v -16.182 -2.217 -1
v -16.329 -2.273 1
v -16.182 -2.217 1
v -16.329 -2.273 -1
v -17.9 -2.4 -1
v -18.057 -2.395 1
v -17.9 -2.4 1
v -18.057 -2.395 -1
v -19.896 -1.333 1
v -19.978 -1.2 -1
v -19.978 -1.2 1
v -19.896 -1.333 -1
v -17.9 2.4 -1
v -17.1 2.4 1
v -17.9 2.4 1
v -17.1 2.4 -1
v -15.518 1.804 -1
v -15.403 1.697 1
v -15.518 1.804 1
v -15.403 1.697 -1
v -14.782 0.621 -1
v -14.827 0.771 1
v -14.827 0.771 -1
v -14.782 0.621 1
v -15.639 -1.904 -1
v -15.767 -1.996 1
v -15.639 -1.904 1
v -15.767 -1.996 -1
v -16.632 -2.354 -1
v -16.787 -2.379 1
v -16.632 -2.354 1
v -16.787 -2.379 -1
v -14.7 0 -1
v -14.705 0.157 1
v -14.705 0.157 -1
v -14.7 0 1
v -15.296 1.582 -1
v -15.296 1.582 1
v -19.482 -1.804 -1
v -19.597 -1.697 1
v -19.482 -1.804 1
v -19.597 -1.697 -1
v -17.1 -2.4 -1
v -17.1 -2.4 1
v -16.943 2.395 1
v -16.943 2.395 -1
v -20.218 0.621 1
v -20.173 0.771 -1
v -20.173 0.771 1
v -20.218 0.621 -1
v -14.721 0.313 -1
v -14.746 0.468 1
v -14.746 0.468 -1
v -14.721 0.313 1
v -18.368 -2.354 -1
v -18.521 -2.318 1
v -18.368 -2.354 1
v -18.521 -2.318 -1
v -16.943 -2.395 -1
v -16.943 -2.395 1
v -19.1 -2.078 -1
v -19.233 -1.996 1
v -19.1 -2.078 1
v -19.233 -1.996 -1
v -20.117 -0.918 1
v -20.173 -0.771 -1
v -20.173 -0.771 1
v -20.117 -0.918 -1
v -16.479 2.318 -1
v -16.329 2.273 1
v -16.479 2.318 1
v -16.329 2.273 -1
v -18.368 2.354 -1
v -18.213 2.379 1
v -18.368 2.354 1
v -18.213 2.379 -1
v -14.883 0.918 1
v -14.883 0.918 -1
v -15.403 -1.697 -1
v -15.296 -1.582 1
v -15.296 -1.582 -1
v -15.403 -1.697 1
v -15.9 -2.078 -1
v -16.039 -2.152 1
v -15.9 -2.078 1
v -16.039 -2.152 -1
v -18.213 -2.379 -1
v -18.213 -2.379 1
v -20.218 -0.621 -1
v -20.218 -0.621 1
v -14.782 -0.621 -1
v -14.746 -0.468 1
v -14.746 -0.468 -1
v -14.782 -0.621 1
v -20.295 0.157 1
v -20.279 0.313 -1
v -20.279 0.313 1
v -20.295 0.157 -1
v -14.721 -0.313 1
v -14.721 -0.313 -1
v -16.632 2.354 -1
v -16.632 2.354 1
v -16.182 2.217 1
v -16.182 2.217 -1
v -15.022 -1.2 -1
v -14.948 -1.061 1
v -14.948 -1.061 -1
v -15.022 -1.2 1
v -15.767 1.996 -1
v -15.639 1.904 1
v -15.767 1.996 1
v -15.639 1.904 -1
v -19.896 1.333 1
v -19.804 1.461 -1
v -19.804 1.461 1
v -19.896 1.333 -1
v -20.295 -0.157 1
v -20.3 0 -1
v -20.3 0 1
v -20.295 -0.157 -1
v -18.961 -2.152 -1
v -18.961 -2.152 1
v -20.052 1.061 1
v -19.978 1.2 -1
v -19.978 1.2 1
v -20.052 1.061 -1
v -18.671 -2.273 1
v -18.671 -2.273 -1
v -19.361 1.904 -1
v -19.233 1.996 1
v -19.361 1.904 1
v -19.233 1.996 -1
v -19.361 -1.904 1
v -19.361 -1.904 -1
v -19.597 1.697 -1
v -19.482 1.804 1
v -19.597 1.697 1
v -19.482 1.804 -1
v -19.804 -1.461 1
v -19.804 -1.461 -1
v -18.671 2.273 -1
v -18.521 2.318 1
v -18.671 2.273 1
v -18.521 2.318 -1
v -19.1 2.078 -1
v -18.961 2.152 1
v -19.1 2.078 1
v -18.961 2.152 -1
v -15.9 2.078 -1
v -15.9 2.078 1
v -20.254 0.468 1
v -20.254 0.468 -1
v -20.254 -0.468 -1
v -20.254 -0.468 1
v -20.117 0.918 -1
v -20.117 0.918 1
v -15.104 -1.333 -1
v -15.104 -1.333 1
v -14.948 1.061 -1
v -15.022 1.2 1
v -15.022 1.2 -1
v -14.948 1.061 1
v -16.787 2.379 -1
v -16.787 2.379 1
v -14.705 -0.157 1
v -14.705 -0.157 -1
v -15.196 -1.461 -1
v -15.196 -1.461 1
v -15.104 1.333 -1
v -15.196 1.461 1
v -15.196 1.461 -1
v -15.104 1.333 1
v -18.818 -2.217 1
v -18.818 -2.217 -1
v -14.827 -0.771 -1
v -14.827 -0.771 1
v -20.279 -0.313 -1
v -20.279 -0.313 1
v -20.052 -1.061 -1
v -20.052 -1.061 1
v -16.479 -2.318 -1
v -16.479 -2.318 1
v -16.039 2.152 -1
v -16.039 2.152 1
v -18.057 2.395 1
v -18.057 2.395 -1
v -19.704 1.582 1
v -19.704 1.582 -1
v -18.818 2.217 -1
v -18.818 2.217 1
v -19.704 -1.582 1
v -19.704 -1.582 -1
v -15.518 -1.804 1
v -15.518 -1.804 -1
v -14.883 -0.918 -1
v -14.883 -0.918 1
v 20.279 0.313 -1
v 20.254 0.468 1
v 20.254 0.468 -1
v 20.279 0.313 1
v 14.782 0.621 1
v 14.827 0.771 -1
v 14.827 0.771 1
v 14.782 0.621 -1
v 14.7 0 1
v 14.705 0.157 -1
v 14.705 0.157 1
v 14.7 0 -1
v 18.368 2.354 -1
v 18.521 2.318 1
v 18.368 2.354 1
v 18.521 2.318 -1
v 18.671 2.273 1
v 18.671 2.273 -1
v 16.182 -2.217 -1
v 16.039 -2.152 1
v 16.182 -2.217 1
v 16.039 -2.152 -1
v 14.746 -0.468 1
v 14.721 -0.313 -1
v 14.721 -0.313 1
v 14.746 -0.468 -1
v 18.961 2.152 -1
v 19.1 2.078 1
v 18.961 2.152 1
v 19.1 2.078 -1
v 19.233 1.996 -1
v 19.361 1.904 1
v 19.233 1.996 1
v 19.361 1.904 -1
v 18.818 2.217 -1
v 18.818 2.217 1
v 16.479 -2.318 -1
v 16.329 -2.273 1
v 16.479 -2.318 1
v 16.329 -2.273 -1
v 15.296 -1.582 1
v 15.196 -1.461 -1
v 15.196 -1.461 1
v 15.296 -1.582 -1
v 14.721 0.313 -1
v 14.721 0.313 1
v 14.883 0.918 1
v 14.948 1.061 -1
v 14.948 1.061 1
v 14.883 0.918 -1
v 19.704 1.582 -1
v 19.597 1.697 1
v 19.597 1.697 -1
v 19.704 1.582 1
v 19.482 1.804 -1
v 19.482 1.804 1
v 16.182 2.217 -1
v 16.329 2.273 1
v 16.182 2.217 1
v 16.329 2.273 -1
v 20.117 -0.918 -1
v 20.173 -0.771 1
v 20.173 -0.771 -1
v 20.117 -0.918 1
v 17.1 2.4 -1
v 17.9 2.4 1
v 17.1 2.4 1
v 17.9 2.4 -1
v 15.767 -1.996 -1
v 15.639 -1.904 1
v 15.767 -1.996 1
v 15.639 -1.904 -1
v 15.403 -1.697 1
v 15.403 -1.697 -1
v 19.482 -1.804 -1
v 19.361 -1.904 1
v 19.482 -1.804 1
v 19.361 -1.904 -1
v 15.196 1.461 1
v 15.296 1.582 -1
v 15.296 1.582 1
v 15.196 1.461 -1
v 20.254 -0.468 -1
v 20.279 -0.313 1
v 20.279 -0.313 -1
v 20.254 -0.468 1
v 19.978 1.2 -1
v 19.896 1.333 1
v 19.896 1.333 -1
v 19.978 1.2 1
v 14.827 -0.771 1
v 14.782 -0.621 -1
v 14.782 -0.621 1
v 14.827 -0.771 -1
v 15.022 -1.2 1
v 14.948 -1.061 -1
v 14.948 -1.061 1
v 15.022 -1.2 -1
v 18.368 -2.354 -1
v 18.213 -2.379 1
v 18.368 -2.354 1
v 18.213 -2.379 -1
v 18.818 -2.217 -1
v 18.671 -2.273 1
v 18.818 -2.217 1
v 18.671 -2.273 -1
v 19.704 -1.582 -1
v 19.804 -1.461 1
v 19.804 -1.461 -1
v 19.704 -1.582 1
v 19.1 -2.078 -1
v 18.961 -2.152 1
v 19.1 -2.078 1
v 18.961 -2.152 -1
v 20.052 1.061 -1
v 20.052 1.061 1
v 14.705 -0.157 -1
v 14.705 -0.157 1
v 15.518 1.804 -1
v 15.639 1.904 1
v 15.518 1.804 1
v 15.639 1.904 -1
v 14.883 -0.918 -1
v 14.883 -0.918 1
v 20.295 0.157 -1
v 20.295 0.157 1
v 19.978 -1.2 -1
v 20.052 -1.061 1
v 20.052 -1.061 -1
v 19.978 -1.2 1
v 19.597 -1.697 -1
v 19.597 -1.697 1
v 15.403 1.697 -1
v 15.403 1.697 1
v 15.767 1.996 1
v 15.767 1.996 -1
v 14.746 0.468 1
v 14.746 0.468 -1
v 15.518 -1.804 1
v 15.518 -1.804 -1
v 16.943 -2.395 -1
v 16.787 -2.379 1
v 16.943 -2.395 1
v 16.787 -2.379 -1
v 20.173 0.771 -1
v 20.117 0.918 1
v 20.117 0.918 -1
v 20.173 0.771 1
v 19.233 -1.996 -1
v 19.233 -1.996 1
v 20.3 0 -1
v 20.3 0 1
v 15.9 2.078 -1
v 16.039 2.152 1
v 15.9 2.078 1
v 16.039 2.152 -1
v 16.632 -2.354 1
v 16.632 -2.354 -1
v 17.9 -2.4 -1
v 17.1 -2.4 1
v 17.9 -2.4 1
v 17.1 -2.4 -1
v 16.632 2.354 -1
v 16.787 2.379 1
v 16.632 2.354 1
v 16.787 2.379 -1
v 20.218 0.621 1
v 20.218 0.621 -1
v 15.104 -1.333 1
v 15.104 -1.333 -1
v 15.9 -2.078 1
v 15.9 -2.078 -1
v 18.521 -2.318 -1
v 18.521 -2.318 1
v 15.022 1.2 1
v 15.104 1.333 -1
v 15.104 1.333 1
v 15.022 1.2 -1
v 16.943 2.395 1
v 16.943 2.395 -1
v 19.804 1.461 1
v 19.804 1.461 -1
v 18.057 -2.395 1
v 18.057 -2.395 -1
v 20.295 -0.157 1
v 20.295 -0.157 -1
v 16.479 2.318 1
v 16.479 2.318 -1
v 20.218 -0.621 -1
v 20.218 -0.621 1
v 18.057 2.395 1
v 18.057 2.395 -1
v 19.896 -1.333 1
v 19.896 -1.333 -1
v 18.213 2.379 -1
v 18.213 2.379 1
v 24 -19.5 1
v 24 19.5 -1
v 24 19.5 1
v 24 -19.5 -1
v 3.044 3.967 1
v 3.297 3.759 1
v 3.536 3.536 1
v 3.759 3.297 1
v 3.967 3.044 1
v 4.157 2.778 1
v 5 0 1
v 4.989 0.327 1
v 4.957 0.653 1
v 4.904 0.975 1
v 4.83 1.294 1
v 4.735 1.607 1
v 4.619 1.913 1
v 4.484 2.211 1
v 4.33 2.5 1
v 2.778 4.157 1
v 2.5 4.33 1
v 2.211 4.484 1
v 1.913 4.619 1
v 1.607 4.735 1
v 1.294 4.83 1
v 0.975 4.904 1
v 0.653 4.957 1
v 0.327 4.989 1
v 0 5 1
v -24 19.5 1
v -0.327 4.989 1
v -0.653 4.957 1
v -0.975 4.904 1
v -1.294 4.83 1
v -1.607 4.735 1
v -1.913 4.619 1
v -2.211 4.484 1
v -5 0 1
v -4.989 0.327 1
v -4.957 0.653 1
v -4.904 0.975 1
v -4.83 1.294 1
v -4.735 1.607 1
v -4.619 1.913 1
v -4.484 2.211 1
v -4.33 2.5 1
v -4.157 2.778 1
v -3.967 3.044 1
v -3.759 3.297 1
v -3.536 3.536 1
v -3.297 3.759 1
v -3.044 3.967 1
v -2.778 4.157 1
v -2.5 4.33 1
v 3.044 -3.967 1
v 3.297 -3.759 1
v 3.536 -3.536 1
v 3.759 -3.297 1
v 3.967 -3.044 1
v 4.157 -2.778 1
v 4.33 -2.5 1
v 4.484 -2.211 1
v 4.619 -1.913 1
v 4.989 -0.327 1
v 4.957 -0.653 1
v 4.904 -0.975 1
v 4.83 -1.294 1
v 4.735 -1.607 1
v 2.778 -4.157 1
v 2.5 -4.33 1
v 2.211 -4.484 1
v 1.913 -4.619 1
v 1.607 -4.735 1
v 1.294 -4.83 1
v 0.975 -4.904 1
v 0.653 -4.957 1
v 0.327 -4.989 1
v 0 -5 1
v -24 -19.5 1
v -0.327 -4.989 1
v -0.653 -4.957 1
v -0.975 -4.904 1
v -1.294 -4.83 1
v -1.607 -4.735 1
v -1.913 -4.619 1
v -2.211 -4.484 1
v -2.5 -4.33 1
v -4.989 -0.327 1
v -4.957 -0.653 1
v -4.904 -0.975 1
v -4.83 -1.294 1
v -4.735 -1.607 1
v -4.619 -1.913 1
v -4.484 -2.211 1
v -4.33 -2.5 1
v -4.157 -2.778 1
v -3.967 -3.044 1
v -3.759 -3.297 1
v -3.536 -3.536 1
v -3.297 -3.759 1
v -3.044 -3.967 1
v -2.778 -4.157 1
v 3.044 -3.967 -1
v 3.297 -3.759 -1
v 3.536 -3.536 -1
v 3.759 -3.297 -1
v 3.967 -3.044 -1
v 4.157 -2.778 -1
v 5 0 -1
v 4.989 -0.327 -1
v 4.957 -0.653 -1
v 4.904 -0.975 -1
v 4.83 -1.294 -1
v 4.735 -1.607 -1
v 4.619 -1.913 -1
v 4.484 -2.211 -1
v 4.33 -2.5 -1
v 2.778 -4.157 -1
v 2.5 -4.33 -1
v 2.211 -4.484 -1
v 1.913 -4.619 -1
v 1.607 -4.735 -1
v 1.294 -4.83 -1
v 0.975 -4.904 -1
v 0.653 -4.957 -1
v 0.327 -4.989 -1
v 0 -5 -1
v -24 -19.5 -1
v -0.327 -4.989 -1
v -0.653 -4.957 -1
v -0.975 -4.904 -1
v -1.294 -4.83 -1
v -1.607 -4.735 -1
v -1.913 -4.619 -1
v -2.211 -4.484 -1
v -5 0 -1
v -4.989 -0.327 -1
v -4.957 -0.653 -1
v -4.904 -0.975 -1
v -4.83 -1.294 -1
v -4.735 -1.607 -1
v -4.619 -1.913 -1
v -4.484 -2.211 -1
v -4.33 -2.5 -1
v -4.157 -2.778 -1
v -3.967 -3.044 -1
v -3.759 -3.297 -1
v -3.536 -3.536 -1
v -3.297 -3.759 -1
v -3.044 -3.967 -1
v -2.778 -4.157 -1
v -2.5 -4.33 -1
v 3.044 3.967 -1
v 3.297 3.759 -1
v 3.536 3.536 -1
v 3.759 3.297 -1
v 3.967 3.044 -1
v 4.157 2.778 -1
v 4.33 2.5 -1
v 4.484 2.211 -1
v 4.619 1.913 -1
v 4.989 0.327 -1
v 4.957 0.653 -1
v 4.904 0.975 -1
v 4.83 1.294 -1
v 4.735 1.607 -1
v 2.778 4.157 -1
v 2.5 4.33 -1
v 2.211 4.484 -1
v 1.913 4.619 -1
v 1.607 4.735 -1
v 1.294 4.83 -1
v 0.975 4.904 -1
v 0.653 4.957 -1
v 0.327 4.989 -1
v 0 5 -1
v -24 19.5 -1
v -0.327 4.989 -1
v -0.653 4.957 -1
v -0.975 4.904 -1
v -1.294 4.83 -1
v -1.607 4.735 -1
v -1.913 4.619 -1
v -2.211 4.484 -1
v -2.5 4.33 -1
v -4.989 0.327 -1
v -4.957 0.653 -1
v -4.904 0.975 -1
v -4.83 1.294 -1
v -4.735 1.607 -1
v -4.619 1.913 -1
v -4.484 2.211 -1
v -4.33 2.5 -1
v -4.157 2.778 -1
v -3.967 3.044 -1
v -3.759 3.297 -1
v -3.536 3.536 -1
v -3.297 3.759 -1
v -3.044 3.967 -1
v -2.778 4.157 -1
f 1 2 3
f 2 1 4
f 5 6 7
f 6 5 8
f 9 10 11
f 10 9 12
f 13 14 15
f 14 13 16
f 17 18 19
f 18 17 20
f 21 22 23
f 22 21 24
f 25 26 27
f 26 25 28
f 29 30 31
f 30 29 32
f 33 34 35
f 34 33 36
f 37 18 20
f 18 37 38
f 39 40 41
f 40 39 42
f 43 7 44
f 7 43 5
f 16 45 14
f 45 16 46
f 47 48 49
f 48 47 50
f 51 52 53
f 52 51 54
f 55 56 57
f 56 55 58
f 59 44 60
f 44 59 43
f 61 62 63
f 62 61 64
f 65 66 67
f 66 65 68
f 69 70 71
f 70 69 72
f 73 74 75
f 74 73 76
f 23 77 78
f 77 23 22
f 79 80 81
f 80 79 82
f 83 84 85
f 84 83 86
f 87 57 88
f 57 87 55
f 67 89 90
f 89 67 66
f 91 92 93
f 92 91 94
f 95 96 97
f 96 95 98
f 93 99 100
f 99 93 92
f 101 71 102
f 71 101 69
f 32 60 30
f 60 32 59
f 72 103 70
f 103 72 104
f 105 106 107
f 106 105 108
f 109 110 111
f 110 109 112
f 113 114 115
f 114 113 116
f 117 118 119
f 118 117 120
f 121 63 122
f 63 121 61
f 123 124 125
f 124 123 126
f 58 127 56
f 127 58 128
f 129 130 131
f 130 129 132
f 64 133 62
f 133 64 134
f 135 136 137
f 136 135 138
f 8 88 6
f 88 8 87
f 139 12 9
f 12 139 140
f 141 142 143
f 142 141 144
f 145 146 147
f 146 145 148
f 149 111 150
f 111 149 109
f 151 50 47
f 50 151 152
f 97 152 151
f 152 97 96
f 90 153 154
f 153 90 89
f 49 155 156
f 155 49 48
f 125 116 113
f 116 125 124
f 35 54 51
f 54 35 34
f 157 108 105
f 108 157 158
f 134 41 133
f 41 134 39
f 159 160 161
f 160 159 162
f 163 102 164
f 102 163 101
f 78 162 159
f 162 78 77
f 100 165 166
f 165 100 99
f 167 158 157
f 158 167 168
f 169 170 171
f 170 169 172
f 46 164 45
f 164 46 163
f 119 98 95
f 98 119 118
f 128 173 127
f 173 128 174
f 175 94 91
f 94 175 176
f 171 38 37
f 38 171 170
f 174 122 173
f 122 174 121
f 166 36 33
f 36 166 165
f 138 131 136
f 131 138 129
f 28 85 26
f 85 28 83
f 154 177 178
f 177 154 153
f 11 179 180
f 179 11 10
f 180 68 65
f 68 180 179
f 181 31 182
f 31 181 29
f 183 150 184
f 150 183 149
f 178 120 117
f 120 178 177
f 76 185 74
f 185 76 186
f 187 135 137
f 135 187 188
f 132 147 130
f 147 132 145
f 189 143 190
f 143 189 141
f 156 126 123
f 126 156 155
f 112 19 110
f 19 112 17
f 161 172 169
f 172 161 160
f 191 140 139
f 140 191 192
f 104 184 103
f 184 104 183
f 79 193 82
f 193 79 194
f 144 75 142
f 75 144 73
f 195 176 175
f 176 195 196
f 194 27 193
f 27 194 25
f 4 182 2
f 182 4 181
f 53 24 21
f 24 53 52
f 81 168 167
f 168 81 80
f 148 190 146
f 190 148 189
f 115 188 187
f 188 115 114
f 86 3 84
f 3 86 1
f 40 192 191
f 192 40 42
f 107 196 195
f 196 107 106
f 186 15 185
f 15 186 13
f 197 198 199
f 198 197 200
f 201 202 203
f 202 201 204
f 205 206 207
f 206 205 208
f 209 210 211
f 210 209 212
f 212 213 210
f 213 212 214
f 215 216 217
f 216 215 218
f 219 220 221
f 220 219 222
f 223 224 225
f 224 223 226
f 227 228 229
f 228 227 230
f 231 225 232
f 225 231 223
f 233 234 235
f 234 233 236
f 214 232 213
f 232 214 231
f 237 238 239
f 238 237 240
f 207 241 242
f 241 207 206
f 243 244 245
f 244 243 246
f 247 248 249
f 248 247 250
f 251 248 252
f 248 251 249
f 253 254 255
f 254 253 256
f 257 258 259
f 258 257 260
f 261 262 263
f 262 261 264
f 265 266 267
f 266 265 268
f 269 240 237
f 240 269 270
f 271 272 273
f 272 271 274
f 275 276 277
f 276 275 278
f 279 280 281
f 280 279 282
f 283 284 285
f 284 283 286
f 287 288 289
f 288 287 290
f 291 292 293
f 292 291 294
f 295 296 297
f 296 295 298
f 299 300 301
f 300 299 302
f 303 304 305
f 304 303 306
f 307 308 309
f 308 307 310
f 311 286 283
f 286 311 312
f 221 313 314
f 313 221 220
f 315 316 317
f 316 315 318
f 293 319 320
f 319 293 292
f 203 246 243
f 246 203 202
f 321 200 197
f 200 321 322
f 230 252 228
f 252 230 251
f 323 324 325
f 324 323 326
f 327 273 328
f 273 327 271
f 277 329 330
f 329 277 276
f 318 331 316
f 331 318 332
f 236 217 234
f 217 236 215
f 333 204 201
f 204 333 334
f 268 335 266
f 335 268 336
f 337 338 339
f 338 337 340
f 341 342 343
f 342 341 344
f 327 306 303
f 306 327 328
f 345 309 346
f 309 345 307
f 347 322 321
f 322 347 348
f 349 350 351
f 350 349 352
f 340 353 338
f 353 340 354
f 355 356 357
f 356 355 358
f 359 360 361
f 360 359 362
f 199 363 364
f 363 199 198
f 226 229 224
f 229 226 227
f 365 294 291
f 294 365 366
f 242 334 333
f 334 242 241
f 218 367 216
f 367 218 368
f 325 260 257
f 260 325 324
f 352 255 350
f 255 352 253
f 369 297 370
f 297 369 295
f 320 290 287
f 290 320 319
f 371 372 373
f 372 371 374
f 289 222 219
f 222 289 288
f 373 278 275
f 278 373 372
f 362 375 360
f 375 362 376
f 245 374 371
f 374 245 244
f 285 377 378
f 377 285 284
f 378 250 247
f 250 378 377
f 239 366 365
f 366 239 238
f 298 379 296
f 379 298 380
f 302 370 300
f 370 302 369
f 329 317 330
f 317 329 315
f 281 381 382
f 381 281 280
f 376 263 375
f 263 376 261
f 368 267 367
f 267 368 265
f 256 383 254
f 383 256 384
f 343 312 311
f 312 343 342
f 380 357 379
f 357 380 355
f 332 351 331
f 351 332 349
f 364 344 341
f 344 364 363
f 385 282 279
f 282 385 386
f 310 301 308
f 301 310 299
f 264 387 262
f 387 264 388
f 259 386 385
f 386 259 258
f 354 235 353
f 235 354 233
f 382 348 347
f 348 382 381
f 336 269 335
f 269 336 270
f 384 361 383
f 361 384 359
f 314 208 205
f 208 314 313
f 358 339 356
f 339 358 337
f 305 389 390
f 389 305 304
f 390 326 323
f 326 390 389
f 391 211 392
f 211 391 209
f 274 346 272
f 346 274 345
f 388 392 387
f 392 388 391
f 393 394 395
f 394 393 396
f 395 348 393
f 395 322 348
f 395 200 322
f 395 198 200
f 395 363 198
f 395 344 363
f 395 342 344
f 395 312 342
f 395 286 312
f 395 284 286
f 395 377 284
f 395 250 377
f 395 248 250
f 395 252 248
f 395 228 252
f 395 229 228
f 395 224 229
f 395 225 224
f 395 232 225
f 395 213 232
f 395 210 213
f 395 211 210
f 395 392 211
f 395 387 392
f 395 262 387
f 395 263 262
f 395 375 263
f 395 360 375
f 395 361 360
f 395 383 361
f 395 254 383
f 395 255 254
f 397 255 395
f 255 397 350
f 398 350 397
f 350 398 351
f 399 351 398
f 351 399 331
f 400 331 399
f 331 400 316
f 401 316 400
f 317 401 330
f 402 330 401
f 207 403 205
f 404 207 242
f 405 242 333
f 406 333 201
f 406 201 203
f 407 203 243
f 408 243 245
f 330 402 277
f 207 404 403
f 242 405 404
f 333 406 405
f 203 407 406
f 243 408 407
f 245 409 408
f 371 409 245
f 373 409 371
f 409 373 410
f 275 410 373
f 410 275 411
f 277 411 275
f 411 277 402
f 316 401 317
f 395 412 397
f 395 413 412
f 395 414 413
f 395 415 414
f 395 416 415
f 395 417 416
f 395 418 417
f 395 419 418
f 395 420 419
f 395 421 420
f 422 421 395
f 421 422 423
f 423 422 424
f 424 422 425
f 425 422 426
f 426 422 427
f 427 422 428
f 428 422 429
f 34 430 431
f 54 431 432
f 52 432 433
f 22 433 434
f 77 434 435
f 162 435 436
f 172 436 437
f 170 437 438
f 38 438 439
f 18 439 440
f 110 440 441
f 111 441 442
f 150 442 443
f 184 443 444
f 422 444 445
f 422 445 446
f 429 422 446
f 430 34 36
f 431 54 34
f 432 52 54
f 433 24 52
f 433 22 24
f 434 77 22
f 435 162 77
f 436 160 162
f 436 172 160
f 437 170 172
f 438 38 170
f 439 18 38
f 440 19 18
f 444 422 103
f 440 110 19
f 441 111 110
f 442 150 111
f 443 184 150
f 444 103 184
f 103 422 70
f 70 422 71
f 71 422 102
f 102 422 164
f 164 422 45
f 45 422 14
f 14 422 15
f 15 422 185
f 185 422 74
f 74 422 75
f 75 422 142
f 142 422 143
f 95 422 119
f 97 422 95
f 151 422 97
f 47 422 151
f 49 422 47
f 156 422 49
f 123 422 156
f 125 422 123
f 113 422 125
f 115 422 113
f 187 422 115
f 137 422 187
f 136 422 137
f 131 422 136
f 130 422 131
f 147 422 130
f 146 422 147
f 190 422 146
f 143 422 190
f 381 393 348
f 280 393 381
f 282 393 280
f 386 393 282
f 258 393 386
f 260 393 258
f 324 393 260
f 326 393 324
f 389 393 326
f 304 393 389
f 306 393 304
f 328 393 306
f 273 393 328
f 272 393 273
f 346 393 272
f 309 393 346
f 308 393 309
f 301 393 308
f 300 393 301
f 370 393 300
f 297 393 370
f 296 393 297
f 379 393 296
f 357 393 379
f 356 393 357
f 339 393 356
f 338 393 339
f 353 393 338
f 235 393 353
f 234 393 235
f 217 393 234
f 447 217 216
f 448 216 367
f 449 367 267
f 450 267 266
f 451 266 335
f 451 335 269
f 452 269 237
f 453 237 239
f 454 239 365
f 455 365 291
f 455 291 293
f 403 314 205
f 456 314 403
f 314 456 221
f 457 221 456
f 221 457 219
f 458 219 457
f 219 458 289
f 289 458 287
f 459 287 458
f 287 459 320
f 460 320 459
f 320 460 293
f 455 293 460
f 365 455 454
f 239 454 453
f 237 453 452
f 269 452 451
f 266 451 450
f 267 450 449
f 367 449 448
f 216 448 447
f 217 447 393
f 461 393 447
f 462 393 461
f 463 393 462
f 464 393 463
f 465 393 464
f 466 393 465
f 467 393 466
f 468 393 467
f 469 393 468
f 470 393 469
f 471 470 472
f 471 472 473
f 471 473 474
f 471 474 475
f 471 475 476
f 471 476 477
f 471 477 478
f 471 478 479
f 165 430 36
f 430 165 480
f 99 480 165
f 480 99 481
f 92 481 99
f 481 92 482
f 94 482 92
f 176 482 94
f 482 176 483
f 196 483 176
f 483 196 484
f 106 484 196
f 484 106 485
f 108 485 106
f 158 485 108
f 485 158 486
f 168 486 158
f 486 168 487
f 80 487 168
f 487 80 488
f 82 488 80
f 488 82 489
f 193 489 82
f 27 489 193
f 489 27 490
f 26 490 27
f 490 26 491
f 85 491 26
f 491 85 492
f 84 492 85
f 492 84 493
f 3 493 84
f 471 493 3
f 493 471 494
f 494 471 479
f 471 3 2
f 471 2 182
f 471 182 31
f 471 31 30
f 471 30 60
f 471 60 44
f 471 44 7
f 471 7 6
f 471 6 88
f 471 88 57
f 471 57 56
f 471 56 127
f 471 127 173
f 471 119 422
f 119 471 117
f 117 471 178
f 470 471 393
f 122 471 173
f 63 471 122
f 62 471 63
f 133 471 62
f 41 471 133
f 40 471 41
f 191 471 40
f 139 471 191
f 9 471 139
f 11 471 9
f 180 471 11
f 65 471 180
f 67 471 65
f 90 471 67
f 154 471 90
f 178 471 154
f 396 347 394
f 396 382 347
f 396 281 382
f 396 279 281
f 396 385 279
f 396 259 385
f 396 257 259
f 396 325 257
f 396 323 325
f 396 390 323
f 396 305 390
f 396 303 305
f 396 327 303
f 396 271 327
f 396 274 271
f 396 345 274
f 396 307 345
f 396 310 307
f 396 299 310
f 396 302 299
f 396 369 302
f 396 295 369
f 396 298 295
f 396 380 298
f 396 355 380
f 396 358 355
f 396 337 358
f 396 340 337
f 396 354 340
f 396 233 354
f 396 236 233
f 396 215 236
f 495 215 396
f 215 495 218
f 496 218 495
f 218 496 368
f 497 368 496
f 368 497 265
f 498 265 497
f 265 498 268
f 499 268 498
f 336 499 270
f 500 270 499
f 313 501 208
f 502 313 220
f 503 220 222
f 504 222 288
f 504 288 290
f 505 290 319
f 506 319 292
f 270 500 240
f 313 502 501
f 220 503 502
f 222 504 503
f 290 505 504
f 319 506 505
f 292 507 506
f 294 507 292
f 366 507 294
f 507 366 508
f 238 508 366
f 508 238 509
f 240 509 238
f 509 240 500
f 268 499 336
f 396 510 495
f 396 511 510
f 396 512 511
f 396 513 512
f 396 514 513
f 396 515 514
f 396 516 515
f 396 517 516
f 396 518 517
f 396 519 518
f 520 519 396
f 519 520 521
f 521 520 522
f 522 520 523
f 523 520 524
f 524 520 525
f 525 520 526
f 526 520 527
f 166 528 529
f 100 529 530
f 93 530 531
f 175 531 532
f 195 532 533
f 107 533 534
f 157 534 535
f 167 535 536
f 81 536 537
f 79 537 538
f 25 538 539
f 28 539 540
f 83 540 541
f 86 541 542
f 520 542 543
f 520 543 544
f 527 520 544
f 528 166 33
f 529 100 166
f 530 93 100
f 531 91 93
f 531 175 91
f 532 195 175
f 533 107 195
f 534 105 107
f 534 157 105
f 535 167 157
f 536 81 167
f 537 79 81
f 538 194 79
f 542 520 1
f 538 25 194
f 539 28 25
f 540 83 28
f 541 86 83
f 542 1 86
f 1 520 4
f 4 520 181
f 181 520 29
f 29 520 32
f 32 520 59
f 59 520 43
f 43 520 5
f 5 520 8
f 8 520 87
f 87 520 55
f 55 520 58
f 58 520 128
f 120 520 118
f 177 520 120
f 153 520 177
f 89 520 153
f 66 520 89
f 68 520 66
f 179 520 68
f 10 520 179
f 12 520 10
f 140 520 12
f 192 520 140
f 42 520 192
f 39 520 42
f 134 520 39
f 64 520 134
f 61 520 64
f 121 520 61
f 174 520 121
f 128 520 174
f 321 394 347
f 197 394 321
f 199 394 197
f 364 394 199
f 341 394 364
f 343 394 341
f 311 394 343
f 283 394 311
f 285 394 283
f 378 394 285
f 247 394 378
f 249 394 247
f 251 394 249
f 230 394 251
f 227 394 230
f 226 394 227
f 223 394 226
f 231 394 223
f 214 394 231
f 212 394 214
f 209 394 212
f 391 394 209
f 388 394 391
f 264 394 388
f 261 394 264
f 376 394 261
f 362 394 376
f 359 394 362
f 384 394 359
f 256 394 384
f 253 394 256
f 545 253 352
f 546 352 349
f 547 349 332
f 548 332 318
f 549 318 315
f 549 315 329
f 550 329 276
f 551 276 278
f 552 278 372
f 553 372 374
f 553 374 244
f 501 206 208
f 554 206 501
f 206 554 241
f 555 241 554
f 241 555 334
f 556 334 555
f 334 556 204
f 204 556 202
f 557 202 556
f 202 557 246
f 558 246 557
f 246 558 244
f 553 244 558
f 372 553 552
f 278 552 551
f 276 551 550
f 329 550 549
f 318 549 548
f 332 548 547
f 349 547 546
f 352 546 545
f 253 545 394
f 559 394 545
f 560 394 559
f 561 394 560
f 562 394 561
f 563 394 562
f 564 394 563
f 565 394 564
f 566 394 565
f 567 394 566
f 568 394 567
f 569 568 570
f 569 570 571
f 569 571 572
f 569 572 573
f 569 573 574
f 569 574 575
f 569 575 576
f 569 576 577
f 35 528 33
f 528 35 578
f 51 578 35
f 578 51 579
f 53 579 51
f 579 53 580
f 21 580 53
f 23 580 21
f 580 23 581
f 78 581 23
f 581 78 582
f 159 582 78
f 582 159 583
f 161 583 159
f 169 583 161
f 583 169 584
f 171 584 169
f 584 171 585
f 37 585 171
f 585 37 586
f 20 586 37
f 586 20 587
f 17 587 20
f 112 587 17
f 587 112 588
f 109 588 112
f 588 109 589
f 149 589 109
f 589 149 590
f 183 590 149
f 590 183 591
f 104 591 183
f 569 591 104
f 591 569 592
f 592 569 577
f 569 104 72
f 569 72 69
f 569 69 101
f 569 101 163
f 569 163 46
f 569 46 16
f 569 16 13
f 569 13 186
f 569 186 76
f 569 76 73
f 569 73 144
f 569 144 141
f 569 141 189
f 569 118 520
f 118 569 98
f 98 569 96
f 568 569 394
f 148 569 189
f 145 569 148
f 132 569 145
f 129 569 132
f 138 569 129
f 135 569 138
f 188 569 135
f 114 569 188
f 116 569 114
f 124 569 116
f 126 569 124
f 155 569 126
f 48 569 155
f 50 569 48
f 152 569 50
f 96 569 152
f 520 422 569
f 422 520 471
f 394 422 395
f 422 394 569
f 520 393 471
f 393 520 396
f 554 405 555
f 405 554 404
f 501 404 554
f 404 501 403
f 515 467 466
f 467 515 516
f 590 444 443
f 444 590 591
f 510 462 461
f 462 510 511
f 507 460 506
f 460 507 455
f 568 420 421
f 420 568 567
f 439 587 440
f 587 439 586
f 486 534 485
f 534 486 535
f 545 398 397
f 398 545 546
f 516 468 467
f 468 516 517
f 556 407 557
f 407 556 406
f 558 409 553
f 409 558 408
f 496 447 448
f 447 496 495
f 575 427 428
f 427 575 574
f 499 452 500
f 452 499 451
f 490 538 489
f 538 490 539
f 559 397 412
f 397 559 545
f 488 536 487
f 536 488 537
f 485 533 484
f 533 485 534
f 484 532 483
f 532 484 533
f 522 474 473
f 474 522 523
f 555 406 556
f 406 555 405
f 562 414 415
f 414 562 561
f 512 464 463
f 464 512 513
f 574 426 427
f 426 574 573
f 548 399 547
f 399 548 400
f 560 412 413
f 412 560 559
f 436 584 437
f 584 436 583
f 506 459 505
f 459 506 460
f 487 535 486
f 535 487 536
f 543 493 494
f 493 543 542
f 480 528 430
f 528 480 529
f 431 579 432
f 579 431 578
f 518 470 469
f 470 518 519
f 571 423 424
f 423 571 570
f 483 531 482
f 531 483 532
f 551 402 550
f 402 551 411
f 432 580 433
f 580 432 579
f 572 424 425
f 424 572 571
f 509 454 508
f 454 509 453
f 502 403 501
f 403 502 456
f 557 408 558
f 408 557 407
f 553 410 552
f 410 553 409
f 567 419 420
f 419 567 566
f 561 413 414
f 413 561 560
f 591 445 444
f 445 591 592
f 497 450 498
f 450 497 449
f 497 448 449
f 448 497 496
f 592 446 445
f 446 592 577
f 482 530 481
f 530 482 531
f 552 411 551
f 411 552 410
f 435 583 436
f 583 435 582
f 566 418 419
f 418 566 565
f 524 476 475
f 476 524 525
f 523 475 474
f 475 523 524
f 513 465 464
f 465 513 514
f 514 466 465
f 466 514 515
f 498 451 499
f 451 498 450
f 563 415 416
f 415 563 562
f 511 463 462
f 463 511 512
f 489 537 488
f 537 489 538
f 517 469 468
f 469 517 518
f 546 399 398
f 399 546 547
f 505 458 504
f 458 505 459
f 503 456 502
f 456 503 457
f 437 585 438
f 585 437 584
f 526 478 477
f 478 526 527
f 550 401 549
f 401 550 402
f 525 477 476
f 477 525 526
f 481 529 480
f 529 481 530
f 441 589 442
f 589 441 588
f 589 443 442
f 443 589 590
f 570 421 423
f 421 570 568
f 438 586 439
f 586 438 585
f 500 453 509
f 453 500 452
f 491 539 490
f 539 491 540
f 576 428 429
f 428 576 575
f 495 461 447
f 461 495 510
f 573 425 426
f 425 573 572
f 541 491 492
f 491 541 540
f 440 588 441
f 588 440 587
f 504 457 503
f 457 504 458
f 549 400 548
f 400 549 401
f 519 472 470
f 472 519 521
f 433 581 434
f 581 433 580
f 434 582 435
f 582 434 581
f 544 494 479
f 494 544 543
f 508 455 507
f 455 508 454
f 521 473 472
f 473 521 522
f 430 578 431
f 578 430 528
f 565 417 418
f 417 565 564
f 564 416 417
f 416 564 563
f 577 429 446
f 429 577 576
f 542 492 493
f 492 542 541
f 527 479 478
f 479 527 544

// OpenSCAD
// Forest Guardian / Seeed 105990072
// Parametric datum plate candidate only; not released for manufacture.
// Units: mm. Orient the 35 mm motor fixing span along the 50 mm reservation.
plate_xy = [48, 39];                 // leaves 1 mm nominal per-side within 50 x 41 reserve
plate_thickness = 2;                 // screening value; material/process not selected
motor_hole_spacing_nominal = 35;
motor_hole_spacing_allowance = 0.4; // slot half-travel; covers drawing +/-0.2 mm
slot_width = 4.8;                    // candidate clearance, not selected fastener fit
boss_clearance_diameter = 10.0;      // motor boss max 9.2 mm; no shaft coupling represented
$fn = 96;

module fixing_slot(xc) {
    hull() {
        translate([xc - motor_hole_spacing_allowance, 0, 0])
            cylinder(d=slot_width, h=plate_thickness + 2, center=true);
        translate([xc + motor_hole_spacing_allowance, 0, 0])
            cylinder(d=slot_width, h=plate_thickness + 2, center=true);
    }
}

module plate() {
    difference() {
        cube([plate_xy[0], plate_xy[1], plate_thickness], center=true);
        cylinder(d=boss_clearance_diameter, h=plate_thickness + 2, center=true);
        for (x = [-motor_hole_spacing_nominal/2, motor_hole_spacing_nominal/2])
            fixing_slot(x);
    }
}

// Dashed bounding envelopes are separate datum solids, not a motor/PCB stack model.
module motor_plan_envelope() {
    color([0.72, 0.55, 0.24, 0.35])
        translate([0, 0, plate_thickness/2 + 0.1])
            cylinder(d=28.1, h=19.3, center=false);
}

plate();
// Set true only when visually inspecting the conservative motor body envelope.
show_motor_envelope = false;
if (show_motor_envelope) motor_plan_envelope();
